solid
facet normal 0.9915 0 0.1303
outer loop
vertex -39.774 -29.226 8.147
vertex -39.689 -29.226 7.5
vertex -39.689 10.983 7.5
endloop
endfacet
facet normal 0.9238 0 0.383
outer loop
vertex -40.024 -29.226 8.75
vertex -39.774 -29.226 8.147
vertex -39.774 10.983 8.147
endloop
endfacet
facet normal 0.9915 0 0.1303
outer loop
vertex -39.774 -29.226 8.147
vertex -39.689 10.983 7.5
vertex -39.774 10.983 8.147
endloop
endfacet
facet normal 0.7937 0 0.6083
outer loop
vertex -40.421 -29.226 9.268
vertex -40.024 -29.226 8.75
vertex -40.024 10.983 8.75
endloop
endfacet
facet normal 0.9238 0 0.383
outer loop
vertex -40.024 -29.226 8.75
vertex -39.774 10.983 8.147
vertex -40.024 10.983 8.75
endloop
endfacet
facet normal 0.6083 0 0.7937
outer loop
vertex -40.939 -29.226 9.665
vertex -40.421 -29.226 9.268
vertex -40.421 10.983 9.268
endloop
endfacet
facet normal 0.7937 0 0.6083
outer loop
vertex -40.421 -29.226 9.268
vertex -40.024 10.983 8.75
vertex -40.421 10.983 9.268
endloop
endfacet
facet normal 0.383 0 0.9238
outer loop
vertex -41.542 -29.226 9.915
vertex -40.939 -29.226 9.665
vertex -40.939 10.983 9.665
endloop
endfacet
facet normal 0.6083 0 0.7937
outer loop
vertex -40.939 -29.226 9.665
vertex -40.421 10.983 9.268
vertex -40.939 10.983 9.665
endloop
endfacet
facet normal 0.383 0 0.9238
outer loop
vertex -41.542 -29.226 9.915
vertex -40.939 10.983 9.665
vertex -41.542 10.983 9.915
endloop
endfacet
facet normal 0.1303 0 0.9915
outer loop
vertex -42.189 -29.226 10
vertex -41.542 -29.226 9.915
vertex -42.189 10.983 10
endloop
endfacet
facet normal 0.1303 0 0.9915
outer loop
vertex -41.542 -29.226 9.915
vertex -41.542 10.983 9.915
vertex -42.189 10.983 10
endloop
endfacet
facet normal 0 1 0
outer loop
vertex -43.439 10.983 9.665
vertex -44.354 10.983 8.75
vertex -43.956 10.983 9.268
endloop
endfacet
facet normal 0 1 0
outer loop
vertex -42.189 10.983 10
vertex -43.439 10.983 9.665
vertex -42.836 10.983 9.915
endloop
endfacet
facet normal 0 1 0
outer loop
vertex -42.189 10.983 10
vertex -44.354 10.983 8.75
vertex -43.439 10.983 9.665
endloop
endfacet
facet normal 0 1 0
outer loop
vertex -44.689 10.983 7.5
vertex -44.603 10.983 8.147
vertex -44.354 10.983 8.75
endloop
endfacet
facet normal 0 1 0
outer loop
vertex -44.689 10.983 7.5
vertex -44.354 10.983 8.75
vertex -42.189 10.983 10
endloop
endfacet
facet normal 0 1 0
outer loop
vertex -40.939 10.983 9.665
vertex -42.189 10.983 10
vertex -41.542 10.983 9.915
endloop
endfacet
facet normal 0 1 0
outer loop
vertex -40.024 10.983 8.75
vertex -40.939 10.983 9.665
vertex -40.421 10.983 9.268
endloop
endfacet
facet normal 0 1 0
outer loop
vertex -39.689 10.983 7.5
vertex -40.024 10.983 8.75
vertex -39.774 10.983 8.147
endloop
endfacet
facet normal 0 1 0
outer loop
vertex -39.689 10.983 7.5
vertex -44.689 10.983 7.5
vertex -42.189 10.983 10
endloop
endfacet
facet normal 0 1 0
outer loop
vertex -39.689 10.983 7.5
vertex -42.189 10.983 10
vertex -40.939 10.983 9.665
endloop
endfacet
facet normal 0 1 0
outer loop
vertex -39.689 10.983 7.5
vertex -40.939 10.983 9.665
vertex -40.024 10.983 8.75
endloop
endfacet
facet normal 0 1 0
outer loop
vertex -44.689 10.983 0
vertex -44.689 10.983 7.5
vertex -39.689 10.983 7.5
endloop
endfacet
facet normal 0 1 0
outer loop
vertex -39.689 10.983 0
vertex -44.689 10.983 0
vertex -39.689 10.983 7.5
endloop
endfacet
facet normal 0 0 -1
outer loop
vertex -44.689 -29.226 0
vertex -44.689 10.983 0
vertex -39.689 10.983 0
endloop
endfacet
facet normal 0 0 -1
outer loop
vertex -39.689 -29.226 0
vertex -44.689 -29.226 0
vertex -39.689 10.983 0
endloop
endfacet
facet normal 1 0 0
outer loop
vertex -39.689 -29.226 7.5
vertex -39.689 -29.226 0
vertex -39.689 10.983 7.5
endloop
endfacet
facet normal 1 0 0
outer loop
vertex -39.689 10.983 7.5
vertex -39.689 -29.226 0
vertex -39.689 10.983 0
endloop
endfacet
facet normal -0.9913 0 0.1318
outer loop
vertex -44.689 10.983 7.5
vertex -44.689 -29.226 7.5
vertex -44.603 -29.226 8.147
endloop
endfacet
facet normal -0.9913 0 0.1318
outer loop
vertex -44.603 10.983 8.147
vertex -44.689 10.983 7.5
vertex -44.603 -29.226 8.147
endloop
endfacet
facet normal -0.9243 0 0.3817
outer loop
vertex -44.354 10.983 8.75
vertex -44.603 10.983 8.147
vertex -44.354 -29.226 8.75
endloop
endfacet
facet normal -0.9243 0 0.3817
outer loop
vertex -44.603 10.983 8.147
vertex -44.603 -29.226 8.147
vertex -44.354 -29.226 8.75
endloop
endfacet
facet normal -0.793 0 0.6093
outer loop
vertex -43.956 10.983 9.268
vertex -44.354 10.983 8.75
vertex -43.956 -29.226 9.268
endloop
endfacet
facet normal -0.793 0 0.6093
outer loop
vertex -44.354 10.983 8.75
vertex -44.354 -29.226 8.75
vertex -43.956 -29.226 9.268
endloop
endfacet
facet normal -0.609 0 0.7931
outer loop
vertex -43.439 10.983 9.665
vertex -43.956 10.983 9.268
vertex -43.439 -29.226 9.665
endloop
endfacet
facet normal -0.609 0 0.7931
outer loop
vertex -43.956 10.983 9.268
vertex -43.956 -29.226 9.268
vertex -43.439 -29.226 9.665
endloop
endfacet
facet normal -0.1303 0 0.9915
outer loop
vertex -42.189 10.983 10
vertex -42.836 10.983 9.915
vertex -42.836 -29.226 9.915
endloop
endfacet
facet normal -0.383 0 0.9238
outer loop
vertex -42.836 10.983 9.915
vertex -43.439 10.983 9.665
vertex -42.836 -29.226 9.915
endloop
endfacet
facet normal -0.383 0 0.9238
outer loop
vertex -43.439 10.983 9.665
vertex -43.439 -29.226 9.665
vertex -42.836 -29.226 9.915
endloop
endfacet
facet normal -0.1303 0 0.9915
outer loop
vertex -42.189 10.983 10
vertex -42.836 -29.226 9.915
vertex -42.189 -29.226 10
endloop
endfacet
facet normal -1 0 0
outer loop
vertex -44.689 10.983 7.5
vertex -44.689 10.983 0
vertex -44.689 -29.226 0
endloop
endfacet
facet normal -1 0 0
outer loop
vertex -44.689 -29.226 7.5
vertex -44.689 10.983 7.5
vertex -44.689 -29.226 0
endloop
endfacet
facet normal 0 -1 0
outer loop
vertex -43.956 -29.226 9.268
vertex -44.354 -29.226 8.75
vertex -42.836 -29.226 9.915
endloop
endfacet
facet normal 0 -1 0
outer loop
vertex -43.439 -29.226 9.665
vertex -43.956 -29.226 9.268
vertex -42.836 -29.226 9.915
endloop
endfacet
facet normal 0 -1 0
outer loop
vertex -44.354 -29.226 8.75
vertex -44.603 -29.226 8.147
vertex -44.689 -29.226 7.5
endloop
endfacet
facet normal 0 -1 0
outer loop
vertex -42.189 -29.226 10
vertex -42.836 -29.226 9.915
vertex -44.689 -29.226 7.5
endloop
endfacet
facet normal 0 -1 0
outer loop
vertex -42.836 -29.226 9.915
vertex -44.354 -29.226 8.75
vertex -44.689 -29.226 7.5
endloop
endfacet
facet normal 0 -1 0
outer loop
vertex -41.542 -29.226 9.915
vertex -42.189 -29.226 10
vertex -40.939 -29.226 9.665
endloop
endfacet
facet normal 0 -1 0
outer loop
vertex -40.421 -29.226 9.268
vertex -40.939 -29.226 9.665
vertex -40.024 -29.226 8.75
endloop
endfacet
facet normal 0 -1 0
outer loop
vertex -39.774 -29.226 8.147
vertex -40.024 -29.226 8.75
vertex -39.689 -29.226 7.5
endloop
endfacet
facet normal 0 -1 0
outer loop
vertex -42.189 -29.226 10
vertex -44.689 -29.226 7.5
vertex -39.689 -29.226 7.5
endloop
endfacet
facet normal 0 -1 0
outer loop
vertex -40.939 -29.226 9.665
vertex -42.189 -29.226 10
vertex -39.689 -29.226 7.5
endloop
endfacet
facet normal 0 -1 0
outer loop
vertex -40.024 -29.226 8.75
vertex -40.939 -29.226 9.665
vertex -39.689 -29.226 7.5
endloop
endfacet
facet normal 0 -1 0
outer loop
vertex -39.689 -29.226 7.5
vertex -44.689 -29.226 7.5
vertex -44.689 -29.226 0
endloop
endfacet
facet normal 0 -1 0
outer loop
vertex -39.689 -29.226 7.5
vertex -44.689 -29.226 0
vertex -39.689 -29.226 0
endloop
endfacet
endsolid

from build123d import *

# Parameters (mm, degrees)
F1_DEPTH = 10
F2_R     = 2.49999
F3_W     = 11.3749653101
F3_H     = 21.1809808388
F4_DEPTH = 25
F5_DEPTH = 25


# Not quite as in the source:
# - a fillet or chamfer is up to 0.001 mm smaller than in the source, because OpenCascade refuses the exact size


with BuildPart() as f1:
    # F0 (on Top) → F1 (new body)
    with BuildSketch(Plane.XY):
        Polygon((-44.6886586582, 25.7738458982), (-44.6886586582, -29.2261541018), (-39.6886586582, -29.2261541018), (-39.6886586582, 20.7738458982), (30.3113413418, 20.7738458982), (30.3113413418, -29.2261541018), (35.3113413418, -29.2261541018), (35.3113413418, 25.7738458982), align=None)
    extrude(amount=F1_DEPTH)

    # F2 (radius 2.5 in the source; OpenCascade refuses exactly that, so slightly less here)
    f2_edges = [f1.edges().sort_by_distance(p)[0] for p in [
        (-44.688659, -1.726154, 10),
        (-39.688659, -4.226154, 10),
        (30.311341, -4.226154, 10),
        (35.311341, -1.726154, 10),
    ]]
    fillet(f2_edges, radius=F2_R)

    # F3 (on Top) → F4 (cut)
    with BuildSketch(Plane.XY):
        Polygon((47.2649559379, 40.0085151196), (-24.1227895021, 40.0085151196), (-24.1227895021, 10.9827276319), (-24.1227895021, -10.1982532069), (-35.4977548122, -10.1982532069), (-35.4977548122, -43.5386821628), (47.2649559379, -43.5386821628), align=None)
        Polygon((-35.4977548122, 10.9827276319), (-35.4977548122, 40.0085151196), (-24.1227895021, 40.0085151196), (-24.1227895021, 54.521407932), (-54.7175332904, 54.521407932), (-54.7175332904, 10.9827276319), align=None)
        with Locations((-29.8102721572, 0.3922372125)):
            Rectangle(F3_W, F3_H)
    extrude(amount=F4_DEPTH, mode=Mode.SUBTRACT)

    # F5 (cut): a face of the model
    f5_faces = [f1.faces().sort_by_distance(p)[0] for p in [
        (-24.1227895021, 23.2738458982, 5),
    ]]
    extrude(f5_faces, amount=-F5_DEPTH, mode=Mode.SUBTRACT)


solid = f1.part
